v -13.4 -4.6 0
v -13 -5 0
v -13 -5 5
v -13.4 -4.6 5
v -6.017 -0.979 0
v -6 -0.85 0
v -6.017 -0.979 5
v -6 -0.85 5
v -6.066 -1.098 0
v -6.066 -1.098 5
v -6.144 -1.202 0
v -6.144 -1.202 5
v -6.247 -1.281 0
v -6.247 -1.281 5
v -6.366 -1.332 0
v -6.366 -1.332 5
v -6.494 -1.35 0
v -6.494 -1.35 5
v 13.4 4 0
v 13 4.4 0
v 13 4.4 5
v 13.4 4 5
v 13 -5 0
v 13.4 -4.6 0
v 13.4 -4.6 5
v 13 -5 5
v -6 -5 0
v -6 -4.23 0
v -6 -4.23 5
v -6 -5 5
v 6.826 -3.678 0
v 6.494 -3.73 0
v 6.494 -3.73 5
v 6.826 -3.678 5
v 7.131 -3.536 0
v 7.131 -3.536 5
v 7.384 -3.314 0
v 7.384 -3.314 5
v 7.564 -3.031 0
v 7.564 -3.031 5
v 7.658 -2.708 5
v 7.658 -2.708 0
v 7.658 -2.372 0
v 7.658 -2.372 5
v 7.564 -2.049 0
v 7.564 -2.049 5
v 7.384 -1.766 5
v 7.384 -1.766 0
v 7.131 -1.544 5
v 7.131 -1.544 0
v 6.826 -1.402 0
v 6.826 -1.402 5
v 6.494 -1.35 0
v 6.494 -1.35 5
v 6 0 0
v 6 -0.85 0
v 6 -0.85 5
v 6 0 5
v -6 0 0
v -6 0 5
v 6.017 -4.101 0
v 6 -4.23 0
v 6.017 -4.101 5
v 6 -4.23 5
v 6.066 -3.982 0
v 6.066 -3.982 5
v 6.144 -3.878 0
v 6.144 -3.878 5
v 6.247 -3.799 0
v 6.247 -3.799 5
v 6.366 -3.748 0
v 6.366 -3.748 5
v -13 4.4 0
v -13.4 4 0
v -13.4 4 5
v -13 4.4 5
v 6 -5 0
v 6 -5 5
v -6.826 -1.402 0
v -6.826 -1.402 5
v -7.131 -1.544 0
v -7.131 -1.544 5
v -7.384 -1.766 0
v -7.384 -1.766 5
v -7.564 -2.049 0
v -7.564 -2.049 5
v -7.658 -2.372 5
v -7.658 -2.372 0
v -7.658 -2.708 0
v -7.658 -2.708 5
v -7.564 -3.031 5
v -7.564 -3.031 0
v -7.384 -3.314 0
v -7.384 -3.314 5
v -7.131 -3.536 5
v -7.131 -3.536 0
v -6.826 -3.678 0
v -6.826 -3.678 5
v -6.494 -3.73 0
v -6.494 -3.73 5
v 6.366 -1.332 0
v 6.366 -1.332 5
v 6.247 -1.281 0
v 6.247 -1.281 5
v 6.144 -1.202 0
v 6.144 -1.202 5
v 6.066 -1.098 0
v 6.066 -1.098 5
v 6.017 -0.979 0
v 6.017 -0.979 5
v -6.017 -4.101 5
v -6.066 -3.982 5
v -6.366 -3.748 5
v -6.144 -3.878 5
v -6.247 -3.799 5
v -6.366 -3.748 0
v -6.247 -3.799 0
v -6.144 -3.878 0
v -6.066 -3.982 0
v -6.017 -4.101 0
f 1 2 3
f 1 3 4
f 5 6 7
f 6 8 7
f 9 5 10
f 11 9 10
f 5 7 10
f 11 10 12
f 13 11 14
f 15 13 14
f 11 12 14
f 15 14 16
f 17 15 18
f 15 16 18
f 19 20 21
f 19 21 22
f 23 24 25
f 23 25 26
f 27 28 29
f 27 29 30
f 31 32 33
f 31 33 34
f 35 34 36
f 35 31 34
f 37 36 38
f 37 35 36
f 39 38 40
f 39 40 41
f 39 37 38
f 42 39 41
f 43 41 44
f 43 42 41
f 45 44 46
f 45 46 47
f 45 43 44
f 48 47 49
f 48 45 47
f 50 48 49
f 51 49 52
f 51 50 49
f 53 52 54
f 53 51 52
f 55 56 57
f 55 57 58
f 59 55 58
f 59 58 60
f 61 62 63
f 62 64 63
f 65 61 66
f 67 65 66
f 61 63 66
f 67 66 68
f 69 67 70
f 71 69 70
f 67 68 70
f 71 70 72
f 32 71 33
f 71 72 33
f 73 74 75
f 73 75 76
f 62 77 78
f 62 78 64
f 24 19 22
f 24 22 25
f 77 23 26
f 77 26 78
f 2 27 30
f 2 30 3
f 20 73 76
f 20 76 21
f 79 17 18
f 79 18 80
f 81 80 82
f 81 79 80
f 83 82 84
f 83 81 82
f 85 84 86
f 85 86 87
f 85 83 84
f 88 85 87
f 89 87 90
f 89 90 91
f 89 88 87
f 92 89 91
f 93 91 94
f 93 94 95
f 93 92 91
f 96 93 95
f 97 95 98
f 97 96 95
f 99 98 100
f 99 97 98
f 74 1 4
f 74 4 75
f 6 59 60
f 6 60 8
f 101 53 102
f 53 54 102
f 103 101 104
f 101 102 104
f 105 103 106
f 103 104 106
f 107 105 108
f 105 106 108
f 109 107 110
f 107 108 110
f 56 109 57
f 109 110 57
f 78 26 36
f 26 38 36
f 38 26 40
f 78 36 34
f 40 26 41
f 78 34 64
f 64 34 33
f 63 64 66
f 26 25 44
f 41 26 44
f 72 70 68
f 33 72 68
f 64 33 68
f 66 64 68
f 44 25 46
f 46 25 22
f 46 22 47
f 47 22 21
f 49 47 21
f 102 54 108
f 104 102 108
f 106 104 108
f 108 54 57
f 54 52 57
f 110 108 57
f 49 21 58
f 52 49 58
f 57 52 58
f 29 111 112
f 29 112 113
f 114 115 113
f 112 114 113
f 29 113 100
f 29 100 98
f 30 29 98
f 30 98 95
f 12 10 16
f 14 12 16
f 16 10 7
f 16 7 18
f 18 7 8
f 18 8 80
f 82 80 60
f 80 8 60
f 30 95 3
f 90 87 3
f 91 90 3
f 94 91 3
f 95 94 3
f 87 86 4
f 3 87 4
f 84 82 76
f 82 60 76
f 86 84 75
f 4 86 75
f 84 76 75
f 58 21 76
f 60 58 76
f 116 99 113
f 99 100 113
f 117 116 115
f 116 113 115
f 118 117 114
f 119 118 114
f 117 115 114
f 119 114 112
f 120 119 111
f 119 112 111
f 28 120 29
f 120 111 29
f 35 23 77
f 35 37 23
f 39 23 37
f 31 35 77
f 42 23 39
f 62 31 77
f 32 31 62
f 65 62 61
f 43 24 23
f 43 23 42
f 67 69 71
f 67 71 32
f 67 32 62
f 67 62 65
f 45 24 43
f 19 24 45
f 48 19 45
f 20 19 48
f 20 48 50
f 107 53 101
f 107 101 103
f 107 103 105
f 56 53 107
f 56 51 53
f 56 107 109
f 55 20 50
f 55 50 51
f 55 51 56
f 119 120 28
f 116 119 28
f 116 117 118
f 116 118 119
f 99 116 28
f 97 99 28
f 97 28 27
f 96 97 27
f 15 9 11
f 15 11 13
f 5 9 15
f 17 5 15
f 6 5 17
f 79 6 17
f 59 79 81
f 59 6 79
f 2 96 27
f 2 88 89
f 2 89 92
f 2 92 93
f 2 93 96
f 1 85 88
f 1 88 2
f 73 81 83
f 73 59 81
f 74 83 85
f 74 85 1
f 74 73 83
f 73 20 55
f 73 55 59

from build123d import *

# Parameters (mm, degrees)
BOSS_EXTRUDE1_DEPTH = 5
FILLET1_R           = 0.5


with BuildPart() as part:
    # Sketch1 → Boss-Extrude1 (new body)
    with BuildSketch(Plane.XY):
        with BuildLine():
            Line((-6, -5), (-13, -5))
            Line((-13, -5), (-13.4, -4.6))
            Line((-13.4, -4.6), (-13.4, 4))
            Line((-13.4, 4), (-13, 4.4))
            Line((-13, 4.4), (13, 4.4))
            Line((13, 4.4), (13.4, 4))
            Line((13.4, 4), (13.4, -4.6))
            Line((13.4, -4.6), (13, -5))
            Line((13, -5), (6, -5))
            Line((6, -5), (6, -3.628898526))
            ThreePointArc((6, -3.628898526), (7.67, -2.54), (6, -1.451101474))
            Line((6, -1.451101474), (6, 0))
            Line((6, 0), (-6, 0))
            Line((-6, 0), (-6, -1.451101474))
            ThreePointArc((-6, -1.451101474), (-7.67, -2.54), (-6, -3.628898526))
            Line((-6, -3.628898526), (-6, -5))
        make_face()
    extrude(amount=BOSS_EXTRUDE1_DEPTH)

    # Fillet1
    fillet1_edges = [part.edges().sort_by_distance(p)[0] for p in [
        (6, -3.628898526, 2.5),
        (6, -1.451101474, 2.5),
        (-6, -1.451101474, 2.5),
        (-6, -3.628898526, 2.5),
    ]]
    fillet(fillet1_edges, radius=FILLET1_R)


solid = part.part
